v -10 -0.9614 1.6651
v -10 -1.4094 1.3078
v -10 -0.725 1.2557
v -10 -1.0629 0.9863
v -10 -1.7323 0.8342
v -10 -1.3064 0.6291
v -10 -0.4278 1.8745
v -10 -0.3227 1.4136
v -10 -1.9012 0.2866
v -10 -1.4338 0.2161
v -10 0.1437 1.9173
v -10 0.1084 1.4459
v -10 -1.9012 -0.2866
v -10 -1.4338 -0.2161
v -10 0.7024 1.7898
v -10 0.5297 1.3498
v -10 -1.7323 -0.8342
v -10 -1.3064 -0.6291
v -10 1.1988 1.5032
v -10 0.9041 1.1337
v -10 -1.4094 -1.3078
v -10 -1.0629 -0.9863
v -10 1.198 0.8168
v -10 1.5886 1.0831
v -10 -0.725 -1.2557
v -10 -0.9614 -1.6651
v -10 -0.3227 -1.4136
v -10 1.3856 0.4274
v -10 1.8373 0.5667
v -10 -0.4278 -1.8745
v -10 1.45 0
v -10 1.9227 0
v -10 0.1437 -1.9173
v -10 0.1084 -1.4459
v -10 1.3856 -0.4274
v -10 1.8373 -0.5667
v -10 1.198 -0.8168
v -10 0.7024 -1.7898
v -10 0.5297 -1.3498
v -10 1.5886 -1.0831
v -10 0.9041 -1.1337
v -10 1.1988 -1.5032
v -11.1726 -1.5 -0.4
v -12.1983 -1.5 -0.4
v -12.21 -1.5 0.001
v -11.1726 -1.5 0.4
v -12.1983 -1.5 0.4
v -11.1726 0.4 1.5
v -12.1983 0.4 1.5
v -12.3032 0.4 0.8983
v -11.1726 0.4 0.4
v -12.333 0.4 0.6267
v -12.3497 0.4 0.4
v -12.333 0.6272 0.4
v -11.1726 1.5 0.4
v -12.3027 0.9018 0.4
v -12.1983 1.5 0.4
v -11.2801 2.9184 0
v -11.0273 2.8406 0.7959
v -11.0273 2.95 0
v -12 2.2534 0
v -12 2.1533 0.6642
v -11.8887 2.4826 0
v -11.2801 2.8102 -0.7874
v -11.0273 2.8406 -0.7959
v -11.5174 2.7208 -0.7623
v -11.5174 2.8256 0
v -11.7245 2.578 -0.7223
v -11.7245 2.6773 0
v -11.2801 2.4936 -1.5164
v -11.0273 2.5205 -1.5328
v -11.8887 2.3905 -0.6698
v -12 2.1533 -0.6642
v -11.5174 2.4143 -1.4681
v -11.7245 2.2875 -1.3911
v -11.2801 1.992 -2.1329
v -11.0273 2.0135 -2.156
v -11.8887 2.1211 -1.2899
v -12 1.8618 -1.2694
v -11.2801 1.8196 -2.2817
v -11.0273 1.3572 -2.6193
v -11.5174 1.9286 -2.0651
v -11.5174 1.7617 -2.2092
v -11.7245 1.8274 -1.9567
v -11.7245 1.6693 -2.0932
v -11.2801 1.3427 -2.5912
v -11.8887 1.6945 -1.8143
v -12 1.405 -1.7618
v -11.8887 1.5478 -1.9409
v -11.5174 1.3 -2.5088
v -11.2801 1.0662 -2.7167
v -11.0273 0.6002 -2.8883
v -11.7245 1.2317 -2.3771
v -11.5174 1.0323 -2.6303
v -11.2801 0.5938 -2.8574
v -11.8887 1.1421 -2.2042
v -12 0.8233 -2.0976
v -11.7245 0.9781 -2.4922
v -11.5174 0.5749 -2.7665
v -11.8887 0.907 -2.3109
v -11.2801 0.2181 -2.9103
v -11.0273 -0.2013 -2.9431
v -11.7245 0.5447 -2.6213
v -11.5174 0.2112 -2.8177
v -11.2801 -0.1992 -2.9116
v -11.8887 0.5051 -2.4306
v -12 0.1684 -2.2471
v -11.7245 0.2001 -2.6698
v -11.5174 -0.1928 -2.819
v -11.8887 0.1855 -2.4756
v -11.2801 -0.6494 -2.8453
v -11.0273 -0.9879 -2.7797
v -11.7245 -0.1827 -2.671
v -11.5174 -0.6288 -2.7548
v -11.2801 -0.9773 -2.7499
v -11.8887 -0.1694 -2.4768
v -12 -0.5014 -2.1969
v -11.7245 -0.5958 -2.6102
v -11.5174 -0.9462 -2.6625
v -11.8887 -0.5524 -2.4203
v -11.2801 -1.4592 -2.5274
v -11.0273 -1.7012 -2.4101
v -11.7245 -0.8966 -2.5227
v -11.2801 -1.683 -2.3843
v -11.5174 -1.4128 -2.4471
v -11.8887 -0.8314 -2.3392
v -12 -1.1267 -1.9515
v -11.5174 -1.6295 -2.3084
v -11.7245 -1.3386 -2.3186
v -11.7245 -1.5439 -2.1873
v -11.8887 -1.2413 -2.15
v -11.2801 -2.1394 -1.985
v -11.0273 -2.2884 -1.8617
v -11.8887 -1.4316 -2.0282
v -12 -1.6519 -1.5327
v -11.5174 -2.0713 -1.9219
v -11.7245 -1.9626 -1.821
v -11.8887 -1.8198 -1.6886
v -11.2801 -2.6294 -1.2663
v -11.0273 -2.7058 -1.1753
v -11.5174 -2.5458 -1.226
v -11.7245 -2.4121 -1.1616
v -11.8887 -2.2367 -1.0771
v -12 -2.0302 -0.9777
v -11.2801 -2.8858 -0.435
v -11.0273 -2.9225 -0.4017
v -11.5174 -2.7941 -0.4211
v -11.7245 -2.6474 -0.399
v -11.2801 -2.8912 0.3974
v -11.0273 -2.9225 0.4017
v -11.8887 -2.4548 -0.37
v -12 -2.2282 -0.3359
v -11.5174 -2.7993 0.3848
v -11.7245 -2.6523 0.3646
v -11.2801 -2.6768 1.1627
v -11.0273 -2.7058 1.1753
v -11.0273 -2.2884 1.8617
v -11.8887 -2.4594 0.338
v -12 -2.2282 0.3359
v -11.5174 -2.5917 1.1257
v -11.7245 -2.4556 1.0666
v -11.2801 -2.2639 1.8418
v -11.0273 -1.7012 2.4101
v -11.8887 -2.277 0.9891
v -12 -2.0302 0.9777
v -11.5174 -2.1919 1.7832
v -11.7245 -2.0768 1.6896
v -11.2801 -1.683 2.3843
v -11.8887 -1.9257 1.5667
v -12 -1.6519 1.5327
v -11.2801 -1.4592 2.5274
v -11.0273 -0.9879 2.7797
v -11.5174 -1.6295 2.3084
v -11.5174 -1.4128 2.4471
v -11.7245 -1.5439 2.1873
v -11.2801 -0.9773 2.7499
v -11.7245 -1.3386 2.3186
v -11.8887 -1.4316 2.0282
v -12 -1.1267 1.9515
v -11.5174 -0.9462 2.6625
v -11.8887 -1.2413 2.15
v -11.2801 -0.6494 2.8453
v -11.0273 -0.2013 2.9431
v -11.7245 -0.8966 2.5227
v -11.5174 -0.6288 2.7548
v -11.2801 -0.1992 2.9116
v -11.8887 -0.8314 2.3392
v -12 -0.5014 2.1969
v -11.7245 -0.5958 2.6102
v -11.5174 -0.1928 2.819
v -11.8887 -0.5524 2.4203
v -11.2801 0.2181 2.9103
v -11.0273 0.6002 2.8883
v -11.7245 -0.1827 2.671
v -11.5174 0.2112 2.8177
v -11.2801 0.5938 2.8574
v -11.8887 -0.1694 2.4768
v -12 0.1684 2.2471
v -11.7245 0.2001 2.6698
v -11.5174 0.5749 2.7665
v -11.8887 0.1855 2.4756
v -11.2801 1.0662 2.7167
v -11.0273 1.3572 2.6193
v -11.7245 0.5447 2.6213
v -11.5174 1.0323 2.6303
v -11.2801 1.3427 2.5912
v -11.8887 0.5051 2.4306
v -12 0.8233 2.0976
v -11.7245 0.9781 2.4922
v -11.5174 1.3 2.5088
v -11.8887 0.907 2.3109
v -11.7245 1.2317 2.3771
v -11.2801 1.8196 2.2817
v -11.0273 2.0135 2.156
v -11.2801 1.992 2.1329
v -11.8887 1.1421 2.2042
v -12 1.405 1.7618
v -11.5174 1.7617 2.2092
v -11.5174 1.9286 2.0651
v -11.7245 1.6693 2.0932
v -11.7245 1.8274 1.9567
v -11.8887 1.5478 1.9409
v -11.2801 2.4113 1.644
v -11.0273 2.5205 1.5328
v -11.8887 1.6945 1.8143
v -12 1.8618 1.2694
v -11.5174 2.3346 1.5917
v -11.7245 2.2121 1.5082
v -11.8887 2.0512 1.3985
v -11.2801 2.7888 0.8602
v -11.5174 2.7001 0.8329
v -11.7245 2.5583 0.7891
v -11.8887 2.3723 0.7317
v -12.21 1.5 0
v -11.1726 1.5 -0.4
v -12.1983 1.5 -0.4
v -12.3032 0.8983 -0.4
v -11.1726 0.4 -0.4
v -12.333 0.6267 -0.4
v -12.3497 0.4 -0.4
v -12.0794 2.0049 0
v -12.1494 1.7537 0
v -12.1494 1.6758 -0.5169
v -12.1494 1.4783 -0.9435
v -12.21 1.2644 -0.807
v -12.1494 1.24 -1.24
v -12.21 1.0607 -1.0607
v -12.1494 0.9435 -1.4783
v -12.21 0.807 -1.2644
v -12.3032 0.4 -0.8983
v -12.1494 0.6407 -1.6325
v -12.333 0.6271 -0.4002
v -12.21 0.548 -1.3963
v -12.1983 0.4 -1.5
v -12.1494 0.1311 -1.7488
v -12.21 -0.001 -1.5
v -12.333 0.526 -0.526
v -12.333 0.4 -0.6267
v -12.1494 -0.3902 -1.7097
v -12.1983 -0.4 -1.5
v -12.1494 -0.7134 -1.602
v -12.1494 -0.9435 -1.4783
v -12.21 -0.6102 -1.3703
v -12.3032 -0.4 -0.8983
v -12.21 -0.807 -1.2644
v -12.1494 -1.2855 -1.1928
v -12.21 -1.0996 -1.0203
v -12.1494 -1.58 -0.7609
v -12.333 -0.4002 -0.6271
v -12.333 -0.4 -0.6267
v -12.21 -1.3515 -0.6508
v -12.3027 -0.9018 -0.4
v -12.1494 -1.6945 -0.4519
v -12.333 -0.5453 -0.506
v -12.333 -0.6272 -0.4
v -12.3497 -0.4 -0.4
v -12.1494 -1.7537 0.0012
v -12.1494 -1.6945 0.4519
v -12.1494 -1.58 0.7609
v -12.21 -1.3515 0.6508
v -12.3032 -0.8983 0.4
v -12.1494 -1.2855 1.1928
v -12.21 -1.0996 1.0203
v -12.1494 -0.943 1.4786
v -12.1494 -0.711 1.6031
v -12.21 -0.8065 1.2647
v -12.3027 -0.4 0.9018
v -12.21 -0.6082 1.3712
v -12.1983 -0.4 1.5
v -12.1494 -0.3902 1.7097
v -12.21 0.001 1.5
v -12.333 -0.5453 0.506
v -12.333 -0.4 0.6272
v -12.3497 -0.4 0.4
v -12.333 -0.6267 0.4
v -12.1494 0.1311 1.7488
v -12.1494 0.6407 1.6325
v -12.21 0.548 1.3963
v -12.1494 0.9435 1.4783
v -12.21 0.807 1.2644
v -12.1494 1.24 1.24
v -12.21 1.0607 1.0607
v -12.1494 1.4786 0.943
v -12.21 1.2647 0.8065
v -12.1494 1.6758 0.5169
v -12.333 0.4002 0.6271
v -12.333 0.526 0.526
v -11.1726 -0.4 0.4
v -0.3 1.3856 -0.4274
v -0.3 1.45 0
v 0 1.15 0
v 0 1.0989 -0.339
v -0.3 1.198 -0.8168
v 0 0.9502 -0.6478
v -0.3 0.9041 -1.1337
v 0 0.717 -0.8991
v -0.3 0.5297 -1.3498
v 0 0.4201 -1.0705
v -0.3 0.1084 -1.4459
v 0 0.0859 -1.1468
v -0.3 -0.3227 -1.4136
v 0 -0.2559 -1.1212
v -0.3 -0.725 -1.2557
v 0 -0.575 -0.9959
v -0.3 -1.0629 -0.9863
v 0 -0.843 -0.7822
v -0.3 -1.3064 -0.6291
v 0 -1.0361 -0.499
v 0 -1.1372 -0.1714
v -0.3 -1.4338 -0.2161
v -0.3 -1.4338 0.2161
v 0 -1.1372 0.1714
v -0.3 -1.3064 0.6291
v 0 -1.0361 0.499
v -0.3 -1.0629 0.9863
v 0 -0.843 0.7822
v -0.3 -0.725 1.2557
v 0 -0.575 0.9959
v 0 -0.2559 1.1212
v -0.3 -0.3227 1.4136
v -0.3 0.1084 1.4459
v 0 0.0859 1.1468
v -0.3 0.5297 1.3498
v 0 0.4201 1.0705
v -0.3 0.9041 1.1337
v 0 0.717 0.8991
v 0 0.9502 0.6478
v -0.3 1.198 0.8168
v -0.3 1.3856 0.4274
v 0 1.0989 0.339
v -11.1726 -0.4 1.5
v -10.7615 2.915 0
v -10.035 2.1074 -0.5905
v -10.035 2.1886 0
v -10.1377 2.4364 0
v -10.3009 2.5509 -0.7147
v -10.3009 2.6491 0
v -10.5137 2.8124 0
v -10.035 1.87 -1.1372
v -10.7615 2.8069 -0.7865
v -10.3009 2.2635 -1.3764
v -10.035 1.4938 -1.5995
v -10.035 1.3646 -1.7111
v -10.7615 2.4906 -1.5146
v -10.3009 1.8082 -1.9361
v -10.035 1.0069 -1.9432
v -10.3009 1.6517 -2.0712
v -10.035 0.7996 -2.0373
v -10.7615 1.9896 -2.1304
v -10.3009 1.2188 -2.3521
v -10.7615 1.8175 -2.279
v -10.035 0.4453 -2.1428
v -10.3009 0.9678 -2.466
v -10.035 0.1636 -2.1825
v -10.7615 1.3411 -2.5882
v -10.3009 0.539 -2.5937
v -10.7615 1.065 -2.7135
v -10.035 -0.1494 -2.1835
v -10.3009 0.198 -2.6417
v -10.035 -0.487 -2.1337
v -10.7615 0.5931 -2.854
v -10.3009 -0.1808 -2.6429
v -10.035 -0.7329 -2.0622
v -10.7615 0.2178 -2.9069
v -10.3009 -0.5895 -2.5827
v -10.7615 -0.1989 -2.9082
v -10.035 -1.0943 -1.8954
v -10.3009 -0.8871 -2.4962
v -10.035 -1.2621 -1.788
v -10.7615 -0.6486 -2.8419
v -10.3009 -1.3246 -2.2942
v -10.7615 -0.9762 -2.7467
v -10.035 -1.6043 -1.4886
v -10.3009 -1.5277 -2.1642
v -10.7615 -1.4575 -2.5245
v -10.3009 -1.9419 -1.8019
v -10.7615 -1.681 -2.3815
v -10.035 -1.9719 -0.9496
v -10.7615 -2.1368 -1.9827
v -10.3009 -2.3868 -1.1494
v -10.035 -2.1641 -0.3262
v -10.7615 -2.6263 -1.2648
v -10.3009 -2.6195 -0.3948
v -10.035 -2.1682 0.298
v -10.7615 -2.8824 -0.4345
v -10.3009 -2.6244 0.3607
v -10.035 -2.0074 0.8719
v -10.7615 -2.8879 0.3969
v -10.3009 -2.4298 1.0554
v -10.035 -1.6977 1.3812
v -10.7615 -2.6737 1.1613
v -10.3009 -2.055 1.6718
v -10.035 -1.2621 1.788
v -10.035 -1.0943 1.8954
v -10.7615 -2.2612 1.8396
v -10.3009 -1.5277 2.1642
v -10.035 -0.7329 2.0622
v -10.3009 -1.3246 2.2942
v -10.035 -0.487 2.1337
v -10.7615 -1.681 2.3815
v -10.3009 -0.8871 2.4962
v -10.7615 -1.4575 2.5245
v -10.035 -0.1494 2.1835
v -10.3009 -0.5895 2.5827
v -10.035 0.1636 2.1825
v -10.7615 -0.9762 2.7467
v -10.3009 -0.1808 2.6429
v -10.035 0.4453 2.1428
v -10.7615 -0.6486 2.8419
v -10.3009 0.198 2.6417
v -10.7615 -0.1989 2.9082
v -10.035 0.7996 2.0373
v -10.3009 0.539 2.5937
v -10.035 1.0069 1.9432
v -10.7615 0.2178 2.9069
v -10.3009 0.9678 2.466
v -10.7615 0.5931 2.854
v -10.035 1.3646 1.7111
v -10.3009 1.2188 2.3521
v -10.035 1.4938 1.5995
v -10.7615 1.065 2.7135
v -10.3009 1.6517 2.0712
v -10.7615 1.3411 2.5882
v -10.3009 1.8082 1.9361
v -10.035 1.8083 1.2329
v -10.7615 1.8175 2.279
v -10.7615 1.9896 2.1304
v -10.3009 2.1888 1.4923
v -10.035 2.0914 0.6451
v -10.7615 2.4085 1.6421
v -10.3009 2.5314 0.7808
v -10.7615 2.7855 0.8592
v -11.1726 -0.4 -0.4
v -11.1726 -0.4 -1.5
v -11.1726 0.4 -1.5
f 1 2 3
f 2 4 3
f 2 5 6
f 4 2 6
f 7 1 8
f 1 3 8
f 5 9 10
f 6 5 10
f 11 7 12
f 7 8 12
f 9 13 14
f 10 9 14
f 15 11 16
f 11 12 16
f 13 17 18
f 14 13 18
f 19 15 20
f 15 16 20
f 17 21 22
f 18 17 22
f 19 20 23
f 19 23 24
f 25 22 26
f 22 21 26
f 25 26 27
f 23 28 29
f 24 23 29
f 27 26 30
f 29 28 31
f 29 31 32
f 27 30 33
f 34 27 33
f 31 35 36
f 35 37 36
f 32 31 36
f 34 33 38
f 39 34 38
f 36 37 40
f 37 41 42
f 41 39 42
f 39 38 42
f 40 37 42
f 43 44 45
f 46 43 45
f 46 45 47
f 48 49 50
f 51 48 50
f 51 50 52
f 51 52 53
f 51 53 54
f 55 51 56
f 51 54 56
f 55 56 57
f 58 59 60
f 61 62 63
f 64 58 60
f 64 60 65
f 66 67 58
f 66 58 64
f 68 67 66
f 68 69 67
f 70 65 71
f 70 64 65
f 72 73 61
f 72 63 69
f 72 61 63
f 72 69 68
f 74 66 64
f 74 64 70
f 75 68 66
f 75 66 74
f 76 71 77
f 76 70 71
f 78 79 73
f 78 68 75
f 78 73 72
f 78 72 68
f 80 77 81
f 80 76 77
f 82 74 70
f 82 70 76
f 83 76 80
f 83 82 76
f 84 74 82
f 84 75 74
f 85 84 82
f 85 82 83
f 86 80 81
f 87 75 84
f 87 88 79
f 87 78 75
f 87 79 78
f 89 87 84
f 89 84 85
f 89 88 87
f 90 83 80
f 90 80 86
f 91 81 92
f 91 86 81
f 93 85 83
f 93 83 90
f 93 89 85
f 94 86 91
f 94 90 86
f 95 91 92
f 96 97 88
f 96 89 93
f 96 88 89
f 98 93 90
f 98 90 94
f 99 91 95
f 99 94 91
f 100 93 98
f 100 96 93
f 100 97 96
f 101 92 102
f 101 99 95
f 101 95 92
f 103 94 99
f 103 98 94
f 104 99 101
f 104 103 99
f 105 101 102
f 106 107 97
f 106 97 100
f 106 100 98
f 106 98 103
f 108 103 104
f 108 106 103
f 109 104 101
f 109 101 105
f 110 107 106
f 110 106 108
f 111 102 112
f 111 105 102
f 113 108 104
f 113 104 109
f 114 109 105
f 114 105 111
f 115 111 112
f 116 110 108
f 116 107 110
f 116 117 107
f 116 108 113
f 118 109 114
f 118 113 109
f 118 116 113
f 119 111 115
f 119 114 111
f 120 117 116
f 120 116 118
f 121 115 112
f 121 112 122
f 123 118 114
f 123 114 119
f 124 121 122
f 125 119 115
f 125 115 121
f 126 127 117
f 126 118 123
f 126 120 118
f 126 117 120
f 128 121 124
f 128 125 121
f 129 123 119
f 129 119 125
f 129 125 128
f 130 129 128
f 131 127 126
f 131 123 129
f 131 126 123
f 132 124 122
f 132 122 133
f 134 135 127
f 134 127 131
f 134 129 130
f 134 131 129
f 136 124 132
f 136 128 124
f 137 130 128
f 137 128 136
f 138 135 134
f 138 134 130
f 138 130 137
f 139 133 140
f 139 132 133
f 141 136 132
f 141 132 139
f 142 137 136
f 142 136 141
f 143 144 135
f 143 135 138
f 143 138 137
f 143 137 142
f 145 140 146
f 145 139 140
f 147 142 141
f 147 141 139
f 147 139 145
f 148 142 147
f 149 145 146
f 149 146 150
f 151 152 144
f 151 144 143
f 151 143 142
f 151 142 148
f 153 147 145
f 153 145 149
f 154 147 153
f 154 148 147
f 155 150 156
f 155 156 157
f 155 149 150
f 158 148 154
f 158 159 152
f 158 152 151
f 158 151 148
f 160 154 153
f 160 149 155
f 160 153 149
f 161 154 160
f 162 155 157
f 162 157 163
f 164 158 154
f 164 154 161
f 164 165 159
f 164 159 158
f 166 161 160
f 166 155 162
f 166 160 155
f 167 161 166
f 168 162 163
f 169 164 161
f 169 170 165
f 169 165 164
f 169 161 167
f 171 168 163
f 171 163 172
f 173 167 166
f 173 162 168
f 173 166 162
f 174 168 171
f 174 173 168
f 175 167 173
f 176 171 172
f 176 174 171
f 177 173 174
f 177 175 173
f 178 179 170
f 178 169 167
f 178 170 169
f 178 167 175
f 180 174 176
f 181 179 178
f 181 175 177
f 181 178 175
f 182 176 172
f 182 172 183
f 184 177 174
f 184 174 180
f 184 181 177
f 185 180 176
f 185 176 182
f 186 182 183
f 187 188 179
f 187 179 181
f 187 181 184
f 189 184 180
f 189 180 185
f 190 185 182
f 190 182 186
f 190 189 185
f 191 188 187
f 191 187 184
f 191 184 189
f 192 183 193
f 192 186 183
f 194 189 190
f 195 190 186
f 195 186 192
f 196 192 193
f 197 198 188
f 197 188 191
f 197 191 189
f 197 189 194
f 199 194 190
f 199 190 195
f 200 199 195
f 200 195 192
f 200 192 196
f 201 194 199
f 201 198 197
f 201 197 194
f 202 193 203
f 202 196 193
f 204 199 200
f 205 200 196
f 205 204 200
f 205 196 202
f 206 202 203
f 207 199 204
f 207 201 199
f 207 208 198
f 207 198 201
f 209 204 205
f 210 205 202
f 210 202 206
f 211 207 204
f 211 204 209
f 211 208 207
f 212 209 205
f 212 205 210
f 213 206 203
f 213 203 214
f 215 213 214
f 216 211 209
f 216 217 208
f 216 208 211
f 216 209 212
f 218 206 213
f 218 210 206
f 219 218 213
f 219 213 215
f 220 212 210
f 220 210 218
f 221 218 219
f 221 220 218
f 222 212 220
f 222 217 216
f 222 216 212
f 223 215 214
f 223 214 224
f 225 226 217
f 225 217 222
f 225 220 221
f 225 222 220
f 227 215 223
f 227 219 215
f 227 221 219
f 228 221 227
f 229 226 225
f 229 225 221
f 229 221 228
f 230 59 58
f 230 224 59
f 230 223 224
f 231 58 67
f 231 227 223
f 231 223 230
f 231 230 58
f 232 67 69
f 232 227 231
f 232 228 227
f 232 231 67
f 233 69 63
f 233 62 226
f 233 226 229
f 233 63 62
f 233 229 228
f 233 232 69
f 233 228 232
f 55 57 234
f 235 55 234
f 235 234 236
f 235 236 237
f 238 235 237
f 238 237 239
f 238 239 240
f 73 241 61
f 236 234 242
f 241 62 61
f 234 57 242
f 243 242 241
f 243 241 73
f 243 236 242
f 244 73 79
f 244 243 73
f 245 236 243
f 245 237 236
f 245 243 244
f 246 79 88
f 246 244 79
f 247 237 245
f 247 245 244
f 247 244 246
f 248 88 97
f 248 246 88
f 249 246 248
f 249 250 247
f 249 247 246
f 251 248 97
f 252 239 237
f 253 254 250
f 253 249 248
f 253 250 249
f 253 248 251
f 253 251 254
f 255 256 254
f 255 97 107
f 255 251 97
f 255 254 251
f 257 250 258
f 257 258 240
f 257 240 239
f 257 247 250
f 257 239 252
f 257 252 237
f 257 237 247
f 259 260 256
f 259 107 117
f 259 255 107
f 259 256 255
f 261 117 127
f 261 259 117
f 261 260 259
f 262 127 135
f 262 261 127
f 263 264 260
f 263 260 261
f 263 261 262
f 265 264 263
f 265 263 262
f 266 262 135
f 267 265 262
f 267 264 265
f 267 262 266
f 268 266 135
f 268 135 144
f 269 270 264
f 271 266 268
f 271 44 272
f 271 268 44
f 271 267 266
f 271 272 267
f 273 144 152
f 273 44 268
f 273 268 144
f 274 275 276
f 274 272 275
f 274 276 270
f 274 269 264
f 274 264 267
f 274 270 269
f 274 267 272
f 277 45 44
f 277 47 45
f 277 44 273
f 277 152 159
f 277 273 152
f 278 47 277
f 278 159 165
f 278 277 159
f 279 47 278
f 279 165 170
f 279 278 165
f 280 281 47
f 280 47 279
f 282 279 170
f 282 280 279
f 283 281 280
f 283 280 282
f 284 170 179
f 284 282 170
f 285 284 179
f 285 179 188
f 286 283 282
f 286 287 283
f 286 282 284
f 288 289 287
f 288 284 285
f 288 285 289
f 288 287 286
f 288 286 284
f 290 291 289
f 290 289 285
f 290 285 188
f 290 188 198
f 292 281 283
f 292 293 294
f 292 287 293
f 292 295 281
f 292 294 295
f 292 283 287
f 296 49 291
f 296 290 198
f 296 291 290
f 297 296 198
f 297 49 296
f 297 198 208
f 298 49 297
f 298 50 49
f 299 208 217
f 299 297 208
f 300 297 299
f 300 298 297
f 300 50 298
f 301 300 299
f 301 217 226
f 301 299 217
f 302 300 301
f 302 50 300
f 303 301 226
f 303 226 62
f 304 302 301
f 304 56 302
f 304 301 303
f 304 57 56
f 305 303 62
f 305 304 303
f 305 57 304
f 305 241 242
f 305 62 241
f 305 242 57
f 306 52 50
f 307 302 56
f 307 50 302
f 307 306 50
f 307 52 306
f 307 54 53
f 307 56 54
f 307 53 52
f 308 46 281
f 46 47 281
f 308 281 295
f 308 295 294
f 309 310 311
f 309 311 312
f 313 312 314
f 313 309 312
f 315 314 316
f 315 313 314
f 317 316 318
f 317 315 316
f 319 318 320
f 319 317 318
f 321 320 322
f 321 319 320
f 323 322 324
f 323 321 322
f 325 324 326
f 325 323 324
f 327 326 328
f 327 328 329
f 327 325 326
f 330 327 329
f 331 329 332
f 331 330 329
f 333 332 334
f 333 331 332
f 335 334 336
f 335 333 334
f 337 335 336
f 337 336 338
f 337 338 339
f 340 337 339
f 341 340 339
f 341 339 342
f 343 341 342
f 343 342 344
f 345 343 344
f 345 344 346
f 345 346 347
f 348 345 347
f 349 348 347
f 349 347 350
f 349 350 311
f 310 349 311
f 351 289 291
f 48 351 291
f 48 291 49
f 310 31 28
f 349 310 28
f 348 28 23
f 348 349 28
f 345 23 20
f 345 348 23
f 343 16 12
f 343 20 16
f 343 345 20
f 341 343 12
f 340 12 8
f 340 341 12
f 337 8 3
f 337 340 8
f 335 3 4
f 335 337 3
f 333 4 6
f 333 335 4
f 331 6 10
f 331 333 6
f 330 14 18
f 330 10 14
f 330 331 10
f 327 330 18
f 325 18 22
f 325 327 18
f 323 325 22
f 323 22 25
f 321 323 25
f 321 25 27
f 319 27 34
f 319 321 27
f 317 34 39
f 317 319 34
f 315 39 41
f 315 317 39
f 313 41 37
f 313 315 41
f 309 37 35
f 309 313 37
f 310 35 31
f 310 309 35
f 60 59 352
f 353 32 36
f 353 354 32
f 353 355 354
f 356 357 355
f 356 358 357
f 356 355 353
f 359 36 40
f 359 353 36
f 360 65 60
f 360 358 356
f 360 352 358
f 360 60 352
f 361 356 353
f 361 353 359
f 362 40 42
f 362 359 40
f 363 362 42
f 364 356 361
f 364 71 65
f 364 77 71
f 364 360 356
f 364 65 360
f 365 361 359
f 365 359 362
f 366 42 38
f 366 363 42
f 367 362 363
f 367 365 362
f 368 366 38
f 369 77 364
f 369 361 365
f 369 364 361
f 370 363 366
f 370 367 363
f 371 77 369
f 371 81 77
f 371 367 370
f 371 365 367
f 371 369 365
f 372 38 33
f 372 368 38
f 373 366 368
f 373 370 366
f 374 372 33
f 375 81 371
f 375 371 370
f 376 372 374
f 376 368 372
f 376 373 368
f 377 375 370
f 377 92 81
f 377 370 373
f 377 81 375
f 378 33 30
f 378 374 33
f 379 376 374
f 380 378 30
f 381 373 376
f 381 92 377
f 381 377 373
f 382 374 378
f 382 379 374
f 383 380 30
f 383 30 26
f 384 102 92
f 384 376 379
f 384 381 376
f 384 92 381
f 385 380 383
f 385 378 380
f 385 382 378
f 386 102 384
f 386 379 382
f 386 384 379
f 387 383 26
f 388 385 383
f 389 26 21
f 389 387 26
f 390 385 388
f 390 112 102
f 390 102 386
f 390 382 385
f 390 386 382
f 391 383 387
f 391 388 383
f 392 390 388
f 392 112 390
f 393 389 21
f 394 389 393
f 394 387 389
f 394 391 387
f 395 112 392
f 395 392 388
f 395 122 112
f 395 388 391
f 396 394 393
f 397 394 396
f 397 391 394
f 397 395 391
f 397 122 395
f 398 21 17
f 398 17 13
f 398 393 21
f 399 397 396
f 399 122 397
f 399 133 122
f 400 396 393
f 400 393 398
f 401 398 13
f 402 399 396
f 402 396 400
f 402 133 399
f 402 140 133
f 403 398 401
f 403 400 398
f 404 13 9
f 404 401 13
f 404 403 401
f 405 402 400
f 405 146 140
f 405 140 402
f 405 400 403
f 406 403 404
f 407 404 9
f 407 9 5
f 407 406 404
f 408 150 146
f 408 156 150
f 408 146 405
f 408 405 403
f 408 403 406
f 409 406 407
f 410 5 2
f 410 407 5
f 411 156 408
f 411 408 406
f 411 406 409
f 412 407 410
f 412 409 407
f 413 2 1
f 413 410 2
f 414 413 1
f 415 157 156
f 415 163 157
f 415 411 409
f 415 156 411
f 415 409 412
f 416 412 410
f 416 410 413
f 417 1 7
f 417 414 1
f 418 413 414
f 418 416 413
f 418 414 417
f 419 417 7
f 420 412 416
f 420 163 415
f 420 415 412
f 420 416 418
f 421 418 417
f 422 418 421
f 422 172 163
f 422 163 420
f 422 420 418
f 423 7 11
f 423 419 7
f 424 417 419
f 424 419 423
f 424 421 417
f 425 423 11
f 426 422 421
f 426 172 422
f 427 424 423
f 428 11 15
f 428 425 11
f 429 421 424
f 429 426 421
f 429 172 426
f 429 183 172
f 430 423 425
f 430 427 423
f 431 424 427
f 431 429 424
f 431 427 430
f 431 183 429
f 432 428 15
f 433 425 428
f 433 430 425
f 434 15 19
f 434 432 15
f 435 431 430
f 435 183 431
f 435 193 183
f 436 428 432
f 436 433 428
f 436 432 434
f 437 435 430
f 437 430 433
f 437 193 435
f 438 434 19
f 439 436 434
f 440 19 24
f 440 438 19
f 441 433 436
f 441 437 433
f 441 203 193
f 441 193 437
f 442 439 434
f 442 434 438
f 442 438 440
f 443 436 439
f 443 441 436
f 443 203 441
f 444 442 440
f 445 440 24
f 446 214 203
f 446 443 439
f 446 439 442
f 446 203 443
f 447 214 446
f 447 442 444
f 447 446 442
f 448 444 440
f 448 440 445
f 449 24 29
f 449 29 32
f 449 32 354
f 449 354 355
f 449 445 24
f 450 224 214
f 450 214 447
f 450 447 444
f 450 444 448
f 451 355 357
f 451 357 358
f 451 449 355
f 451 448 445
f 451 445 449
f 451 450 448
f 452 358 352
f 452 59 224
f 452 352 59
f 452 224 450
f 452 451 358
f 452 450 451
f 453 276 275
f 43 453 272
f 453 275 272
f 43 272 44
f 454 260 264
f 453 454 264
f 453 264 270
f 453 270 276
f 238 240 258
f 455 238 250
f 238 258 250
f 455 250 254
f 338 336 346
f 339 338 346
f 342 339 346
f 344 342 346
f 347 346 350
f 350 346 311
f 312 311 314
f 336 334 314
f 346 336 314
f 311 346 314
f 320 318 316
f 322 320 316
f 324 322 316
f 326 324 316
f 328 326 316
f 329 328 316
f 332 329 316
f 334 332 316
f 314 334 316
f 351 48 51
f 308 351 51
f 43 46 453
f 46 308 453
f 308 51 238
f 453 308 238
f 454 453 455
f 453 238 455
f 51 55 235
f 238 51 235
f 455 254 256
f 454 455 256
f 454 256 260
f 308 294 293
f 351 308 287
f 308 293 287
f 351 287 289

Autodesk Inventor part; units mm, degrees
ref_plane "YZ Plane" through (0, 0, 0) normal (1, 0, 0) x (0, 1, 0)
ref_plane "XZ Plane" through (0, 0, 0) normal (0, 1, 0) x (-1, 0, 0)
sketch "Эскиз1" plane through (0, 0, 0) normal (0, 0, 1) x (1, 0, 0)
  line L0 (0, 0) -> (-12.3726, 0)
  arc A0 (-10, 1.9227) -> (-12, 2.2534) centre (-11.0273, 1.9227) ccw
  line L1 (-10, 1.9227) -> (-10, 1.45)
  line L2 (-10, 1.45) -> (0, 1.45)
  line L3 (0, 1.45) -> (0, 0)
  line L4 (-12.6724, 2.95) -> (-10.1128, 2.95)
  arc A1 (-12, 2.2534) -> (-12.3726, 0) centre (-5.3726, 0) ccw
  dimension "d0" = 2.9
  dimension "d1" = 5.9
  dimension "d2" = 2
  dimension "d3" = 10
  dimension "d4" = 7
revolve "Вращение1" add sketch "Эскиз1" angle 360 about axis through (0, 0, 0) along (-1, 0, 0)
chamfer "Фаска1" distance 0.3 angle 45 1 edges at (0, -1.45, 0)
ref_plane "РабПлоскость2" through (-12.3726, 0, 0) normal (1, 0, 0) x (0, 0, -1)
sketch "Эскиз2" plane through (-12.3726, 0, 0) normal (1, 0, 0) x (0, 0, -1)
  line L0 (-0.4, 1.5) -> (0.4, 1.5)
  line L1 (0.4, 1.5) -> (0.4, -1.5)
  line L2 (0.4, -1.5) -> (-0.4, -1.5)
  line L3 (-0.4, -1.5) -> (-0.4, 1.5)
  line L4 (-1.5, 0.4) -> (1.5, 0.4)
  line L5 (1.5, 0.4) -> (1.5, -0.4)
  line L6 (1.5, -0.4) -> (-1.5, -0.4)
  line L7 (-1.5, -0.4) -> (-1.5, 0.4)
  point P0 (0, 0)
  point P1 (0, 1.5)
  point P2 (0, 0.4)
  point P3 (-1.5, 0)
  point P4 (-0.4, 0)
  point P5 (0.4, 0.4)
  point P6 (-0.4, 0.4)
  point P7 (-0.4, -0.4)
  point P8 (0.4, -0.4)
  dimension "d10" = 0.8
  dimension "d11" = 3
extrude "Выдавливание1" cut sketch "Эскиз2" along normal blind 1.2
properties part number "Винт М3х19"
